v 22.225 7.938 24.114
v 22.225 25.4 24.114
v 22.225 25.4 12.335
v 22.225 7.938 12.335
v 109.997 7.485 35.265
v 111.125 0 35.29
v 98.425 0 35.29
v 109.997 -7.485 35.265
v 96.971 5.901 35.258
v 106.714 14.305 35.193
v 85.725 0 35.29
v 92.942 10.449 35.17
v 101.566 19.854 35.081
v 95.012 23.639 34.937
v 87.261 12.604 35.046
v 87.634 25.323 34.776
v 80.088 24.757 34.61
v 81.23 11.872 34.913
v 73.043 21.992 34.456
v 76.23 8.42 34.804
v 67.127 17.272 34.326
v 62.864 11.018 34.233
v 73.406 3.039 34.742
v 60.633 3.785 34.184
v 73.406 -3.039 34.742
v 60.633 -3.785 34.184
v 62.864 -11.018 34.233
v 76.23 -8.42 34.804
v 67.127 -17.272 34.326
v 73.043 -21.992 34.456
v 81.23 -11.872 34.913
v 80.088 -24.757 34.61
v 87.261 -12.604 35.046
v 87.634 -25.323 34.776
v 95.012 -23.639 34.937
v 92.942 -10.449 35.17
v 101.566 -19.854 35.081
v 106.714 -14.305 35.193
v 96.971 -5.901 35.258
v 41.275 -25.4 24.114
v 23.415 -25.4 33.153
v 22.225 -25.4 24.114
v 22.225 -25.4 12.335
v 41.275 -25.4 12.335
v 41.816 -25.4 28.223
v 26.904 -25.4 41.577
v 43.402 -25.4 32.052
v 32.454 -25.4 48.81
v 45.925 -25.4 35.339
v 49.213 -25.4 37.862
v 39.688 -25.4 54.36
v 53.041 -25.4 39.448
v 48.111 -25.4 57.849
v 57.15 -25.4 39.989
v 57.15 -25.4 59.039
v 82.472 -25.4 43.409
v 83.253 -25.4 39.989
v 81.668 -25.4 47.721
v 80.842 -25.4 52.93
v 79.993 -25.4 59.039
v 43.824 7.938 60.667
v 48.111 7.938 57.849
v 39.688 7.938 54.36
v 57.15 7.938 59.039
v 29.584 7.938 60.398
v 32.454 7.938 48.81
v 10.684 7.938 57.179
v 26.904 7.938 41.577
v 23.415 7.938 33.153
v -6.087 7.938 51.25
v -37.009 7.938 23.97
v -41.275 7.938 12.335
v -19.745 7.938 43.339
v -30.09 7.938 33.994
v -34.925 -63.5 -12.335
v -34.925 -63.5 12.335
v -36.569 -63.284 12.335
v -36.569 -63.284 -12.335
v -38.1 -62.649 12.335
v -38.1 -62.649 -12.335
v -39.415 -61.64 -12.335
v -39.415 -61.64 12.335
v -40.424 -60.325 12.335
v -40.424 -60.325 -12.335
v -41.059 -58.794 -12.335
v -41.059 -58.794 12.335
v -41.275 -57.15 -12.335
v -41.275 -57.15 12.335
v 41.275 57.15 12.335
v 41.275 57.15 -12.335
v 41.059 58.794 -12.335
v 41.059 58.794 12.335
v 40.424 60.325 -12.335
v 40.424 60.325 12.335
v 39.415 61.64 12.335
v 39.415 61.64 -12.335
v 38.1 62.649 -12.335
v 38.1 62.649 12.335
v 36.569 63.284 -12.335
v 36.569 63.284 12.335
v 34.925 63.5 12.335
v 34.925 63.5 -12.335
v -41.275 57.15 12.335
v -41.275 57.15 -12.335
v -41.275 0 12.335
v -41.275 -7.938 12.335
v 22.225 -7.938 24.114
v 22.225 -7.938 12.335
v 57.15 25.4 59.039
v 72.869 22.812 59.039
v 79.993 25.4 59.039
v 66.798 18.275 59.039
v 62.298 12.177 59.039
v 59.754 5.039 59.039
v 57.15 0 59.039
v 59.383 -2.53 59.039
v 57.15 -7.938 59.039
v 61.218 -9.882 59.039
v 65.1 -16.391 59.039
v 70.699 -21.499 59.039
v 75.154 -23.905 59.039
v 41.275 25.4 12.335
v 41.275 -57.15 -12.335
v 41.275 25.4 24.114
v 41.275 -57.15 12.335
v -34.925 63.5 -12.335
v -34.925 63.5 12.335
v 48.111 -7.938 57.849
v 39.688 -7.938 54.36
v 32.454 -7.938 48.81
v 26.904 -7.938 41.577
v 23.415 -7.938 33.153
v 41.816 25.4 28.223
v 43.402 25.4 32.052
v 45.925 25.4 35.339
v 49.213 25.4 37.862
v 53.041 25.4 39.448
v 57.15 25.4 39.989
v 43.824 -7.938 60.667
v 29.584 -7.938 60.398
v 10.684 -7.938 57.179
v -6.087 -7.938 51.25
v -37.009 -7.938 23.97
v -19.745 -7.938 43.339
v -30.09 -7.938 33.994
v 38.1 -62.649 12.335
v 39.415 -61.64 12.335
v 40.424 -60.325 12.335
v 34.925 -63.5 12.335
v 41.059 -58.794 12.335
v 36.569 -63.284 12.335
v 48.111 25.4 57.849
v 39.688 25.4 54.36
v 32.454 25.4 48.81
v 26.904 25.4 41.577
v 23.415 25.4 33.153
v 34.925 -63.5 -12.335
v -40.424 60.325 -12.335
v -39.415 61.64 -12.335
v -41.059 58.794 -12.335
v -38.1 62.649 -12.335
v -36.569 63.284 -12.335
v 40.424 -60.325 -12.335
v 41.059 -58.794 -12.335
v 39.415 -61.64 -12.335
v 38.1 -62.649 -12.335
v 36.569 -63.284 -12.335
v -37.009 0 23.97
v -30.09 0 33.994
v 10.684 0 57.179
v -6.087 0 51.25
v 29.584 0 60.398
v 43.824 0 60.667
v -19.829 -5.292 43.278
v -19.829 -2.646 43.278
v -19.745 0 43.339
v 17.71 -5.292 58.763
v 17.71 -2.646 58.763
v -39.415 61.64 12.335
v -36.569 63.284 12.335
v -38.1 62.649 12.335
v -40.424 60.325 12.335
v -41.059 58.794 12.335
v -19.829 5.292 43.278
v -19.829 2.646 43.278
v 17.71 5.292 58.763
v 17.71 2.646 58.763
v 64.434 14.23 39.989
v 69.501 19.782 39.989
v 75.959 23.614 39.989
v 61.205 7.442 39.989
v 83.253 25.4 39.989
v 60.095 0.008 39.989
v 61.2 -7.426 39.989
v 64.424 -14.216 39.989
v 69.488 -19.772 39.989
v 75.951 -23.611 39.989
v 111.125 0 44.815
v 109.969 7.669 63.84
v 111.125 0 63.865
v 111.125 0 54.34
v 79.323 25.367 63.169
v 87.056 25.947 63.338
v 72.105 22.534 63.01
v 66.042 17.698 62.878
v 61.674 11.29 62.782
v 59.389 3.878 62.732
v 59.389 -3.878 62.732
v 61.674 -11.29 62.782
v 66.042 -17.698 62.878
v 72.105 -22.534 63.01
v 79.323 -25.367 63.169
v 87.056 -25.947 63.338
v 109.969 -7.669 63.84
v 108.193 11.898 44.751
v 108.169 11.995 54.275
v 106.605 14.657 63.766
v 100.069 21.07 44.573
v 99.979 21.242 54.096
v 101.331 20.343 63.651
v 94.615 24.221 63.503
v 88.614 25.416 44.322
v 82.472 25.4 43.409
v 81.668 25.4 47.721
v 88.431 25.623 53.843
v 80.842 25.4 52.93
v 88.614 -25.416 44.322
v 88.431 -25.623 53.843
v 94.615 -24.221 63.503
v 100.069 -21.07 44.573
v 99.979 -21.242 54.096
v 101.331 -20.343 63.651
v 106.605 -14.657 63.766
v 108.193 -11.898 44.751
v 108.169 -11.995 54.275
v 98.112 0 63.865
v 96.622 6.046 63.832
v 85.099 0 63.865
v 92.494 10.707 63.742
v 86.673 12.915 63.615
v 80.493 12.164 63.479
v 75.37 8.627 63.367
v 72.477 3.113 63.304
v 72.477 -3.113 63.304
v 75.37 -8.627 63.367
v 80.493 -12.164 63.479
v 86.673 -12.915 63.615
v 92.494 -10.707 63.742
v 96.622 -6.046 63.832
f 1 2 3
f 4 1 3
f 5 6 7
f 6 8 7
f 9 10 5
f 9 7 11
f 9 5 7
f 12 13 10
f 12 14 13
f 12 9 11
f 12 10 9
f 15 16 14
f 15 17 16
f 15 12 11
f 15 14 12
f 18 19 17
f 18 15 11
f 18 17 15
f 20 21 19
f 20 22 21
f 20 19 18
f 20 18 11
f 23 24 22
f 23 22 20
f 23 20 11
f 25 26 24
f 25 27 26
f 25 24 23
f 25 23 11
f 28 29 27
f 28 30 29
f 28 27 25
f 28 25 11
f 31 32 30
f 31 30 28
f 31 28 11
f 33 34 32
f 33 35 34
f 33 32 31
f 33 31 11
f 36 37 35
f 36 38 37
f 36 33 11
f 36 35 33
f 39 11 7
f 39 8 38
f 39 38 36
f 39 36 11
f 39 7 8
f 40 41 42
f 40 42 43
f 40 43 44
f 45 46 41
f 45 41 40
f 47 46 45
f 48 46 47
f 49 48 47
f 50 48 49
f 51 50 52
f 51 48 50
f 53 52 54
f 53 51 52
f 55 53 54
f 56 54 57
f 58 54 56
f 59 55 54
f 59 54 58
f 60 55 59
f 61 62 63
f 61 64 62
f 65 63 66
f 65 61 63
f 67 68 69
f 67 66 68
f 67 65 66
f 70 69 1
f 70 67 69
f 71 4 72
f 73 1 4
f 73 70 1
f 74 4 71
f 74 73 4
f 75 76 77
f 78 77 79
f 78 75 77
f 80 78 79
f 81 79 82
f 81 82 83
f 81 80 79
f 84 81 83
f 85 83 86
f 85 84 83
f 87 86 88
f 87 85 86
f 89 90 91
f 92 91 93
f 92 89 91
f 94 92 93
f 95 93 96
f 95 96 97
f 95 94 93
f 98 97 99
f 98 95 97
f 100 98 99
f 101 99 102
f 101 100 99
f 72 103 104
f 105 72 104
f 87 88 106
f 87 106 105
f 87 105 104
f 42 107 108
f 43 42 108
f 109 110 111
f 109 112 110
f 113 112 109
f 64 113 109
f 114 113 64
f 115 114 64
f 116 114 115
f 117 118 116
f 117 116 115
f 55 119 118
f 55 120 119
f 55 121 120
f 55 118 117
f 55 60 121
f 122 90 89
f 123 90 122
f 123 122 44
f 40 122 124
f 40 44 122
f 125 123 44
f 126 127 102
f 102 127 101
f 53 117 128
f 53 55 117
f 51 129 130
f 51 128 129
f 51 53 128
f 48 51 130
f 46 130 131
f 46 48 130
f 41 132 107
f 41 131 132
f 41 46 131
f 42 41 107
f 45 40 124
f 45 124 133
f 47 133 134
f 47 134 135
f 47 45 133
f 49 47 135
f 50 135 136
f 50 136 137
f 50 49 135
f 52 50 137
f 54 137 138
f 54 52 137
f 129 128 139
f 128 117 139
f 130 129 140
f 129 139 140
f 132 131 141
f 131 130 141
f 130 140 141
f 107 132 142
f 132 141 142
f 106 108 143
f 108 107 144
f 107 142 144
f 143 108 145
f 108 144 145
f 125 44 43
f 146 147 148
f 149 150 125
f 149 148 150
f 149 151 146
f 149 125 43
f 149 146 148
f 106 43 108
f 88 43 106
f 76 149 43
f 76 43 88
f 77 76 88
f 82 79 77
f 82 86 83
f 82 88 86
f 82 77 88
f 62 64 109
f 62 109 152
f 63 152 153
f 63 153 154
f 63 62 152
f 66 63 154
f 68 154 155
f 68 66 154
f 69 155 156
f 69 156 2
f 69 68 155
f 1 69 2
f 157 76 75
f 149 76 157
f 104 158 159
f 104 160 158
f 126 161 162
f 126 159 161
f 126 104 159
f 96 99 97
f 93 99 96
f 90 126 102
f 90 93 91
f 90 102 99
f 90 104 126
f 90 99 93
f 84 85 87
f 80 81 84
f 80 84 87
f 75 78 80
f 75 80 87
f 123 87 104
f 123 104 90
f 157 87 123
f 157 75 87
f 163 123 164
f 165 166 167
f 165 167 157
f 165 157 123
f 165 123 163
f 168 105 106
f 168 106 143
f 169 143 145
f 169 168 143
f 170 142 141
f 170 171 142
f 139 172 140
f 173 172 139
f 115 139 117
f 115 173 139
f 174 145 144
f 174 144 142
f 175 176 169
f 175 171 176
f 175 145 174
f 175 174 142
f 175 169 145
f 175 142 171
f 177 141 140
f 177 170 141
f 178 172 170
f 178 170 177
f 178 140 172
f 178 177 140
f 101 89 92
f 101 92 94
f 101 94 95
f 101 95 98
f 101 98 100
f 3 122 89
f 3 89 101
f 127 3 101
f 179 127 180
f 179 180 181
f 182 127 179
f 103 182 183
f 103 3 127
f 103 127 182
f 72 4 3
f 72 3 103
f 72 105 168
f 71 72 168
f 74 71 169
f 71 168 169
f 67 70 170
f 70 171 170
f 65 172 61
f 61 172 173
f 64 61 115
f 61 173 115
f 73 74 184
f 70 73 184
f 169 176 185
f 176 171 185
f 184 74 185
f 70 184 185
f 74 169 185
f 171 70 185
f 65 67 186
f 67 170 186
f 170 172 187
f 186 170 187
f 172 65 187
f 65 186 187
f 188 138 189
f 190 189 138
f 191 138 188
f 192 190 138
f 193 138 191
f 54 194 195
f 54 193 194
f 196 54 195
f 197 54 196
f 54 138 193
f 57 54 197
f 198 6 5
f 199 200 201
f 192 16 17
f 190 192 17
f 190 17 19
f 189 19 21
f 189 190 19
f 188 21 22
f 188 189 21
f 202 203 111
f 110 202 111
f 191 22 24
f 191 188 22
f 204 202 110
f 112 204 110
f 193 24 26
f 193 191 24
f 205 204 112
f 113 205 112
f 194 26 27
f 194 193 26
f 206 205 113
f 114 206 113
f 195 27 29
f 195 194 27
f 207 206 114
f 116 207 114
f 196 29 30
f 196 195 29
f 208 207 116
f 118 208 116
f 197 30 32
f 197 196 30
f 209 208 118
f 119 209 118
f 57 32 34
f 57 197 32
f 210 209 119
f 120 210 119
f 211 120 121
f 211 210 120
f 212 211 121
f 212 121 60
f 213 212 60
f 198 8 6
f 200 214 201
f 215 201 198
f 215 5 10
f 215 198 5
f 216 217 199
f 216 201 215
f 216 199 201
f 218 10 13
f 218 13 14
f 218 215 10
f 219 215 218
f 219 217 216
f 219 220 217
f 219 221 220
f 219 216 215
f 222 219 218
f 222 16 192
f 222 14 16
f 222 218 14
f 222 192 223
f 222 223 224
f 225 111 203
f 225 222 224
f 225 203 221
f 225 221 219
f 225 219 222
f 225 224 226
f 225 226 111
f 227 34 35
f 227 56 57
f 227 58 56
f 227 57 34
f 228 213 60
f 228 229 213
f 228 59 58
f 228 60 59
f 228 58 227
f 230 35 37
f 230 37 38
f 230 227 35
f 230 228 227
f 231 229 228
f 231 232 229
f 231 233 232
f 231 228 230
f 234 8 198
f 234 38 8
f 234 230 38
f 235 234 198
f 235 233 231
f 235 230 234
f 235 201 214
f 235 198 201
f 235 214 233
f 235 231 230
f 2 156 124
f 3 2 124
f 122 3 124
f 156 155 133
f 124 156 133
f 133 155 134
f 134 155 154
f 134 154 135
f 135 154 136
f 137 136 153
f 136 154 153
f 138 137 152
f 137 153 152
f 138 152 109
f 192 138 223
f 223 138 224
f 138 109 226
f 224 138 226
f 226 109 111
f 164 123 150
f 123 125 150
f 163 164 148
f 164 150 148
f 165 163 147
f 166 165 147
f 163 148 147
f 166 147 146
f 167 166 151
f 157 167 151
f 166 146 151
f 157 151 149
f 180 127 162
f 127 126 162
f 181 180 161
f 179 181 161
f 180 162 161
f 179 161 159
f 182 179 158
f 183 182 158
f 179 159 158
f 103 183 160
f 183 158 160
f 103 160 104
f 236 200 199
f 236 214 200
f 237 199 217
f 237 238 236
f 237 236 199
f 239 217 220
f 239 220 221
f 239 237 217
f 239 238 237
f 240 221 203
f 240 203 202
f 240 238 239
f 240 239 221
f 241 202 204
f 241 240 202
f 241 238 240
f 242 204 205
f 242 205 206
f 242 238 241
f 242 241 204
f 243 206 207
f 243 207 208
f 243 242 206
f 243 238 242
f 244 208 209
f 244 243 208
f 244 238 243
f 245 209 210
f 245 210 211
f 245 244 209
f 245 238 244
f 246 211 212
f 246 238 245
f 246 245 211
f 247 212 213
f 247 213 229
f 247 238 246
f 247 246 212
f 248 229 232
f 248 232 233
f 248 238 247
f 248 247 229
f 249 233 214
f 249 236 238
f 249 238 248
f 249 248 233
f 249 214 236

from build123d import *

# Parameters (mm, degrees)
F1_DEPTH = 63.5
F0_W     = 24.7741062101
F0_H     = 19.05
F2_DEPTH = 25.4
F3_DEPTH = 7.9375
F5_R     = 6.35


with BuildPart() as f1:
    # F0 (on Front) → F1 (new body, symmetric)
    with BuildSketch(Plane.XZ):
        Polygon((22.225, 12.3348908712), (-41.275, 12.3348908712), (-41.275, -12.3348908712), (41.275, -12.3348908712), (41.275, 12.3348908712), align=None)
    extrude(amount=F1_DEPTH, both=True)

    # F0 (on Front) → F2 (join, symmetric)
    with BuildSketch(Plane.XZ):
        with BuildLine():
            Line((22.225, 24.1141091288), (22.225, 12.3348908712))
            Line((22.225, 12.3348908712), (41.275, 12.3348908712))
            Line((41.275, 12.3348908712), (41.275, 24.1141091288))
            ThreePointArc((41.275, 24.1141091288), (45.9246798487, 35.3394292801), (57.15, 39.9891091288))
            Line((57.15, 39.9891091288), (60.325, 39.9891091288))
            Line((60.325, 39.9891091288), (60.325, 59.0391091288))
            Line((60.325, 59.0391091288), (57.15, 59.0391091288))
            ThreePointArc((57.15, 59.0391091288), (32.4542956671, 48.8098134617), (22.225, 24.1141091288))
        make_face()
        with Locations((72.7120531051, 49.5141091288)):
            Rectangle(F0_W, F0_H)
    extrude(amount=F2_DEPTH, both=True)

    # F0 (on Front) → F3 (join, symmetric)
    with BuildSketch(Plane.XZ):
        with BuildLine():
            add(Edge.make_bspline(
                [(-41.275, 12.3348908712), (-32.6056554914, 51.0892942548), (21.4900877327, 66.2850886583), (57.15, 59.0391091288)],
                knots=[0, 0, 0, 0, 108.9438599833, 108.9438599833, 108.9438599833, 108.9438599833], degree=3))
            Line((-41.275, 12.3348908712), (22.225, 12.3348908712))
            Line((22.225, 12.3348908712), (22.225, 24.1141091288))
            ThreePointArc((22.225, 24.1141091288), (32.4542956671, 48.8098134617), (57.15, 59.0391091288))
        make_face()
    extrude(amount=F3_DEPTH, both=True)

    # F0 (on Front) → F4 (revolve)
    with BuildSketch(Plane.XZ):
        Polygon((111.125, 63.8651091288), (85.0991062101, 63.8651091288), (85.725, 35.2901091288), (111.125, 35.2901091288), align=None)
    revolve(axis=Axis((85.4120531051, 0, 49.5776091288), (-0.0218982923, 0, 0.9997602036)))

    # F5
    f5_edges = [f1.edges().sort_by_distance(p)[0] for p in [
        (-41.275, -63.5, 0),
        (41.275, -63.5, 0),
        (41.275, 63.5, 0),
        (-41.275, 63.5, 0),
    ]]
    fillet(f5_edges, radius=F5_R)


solid = f1.part
